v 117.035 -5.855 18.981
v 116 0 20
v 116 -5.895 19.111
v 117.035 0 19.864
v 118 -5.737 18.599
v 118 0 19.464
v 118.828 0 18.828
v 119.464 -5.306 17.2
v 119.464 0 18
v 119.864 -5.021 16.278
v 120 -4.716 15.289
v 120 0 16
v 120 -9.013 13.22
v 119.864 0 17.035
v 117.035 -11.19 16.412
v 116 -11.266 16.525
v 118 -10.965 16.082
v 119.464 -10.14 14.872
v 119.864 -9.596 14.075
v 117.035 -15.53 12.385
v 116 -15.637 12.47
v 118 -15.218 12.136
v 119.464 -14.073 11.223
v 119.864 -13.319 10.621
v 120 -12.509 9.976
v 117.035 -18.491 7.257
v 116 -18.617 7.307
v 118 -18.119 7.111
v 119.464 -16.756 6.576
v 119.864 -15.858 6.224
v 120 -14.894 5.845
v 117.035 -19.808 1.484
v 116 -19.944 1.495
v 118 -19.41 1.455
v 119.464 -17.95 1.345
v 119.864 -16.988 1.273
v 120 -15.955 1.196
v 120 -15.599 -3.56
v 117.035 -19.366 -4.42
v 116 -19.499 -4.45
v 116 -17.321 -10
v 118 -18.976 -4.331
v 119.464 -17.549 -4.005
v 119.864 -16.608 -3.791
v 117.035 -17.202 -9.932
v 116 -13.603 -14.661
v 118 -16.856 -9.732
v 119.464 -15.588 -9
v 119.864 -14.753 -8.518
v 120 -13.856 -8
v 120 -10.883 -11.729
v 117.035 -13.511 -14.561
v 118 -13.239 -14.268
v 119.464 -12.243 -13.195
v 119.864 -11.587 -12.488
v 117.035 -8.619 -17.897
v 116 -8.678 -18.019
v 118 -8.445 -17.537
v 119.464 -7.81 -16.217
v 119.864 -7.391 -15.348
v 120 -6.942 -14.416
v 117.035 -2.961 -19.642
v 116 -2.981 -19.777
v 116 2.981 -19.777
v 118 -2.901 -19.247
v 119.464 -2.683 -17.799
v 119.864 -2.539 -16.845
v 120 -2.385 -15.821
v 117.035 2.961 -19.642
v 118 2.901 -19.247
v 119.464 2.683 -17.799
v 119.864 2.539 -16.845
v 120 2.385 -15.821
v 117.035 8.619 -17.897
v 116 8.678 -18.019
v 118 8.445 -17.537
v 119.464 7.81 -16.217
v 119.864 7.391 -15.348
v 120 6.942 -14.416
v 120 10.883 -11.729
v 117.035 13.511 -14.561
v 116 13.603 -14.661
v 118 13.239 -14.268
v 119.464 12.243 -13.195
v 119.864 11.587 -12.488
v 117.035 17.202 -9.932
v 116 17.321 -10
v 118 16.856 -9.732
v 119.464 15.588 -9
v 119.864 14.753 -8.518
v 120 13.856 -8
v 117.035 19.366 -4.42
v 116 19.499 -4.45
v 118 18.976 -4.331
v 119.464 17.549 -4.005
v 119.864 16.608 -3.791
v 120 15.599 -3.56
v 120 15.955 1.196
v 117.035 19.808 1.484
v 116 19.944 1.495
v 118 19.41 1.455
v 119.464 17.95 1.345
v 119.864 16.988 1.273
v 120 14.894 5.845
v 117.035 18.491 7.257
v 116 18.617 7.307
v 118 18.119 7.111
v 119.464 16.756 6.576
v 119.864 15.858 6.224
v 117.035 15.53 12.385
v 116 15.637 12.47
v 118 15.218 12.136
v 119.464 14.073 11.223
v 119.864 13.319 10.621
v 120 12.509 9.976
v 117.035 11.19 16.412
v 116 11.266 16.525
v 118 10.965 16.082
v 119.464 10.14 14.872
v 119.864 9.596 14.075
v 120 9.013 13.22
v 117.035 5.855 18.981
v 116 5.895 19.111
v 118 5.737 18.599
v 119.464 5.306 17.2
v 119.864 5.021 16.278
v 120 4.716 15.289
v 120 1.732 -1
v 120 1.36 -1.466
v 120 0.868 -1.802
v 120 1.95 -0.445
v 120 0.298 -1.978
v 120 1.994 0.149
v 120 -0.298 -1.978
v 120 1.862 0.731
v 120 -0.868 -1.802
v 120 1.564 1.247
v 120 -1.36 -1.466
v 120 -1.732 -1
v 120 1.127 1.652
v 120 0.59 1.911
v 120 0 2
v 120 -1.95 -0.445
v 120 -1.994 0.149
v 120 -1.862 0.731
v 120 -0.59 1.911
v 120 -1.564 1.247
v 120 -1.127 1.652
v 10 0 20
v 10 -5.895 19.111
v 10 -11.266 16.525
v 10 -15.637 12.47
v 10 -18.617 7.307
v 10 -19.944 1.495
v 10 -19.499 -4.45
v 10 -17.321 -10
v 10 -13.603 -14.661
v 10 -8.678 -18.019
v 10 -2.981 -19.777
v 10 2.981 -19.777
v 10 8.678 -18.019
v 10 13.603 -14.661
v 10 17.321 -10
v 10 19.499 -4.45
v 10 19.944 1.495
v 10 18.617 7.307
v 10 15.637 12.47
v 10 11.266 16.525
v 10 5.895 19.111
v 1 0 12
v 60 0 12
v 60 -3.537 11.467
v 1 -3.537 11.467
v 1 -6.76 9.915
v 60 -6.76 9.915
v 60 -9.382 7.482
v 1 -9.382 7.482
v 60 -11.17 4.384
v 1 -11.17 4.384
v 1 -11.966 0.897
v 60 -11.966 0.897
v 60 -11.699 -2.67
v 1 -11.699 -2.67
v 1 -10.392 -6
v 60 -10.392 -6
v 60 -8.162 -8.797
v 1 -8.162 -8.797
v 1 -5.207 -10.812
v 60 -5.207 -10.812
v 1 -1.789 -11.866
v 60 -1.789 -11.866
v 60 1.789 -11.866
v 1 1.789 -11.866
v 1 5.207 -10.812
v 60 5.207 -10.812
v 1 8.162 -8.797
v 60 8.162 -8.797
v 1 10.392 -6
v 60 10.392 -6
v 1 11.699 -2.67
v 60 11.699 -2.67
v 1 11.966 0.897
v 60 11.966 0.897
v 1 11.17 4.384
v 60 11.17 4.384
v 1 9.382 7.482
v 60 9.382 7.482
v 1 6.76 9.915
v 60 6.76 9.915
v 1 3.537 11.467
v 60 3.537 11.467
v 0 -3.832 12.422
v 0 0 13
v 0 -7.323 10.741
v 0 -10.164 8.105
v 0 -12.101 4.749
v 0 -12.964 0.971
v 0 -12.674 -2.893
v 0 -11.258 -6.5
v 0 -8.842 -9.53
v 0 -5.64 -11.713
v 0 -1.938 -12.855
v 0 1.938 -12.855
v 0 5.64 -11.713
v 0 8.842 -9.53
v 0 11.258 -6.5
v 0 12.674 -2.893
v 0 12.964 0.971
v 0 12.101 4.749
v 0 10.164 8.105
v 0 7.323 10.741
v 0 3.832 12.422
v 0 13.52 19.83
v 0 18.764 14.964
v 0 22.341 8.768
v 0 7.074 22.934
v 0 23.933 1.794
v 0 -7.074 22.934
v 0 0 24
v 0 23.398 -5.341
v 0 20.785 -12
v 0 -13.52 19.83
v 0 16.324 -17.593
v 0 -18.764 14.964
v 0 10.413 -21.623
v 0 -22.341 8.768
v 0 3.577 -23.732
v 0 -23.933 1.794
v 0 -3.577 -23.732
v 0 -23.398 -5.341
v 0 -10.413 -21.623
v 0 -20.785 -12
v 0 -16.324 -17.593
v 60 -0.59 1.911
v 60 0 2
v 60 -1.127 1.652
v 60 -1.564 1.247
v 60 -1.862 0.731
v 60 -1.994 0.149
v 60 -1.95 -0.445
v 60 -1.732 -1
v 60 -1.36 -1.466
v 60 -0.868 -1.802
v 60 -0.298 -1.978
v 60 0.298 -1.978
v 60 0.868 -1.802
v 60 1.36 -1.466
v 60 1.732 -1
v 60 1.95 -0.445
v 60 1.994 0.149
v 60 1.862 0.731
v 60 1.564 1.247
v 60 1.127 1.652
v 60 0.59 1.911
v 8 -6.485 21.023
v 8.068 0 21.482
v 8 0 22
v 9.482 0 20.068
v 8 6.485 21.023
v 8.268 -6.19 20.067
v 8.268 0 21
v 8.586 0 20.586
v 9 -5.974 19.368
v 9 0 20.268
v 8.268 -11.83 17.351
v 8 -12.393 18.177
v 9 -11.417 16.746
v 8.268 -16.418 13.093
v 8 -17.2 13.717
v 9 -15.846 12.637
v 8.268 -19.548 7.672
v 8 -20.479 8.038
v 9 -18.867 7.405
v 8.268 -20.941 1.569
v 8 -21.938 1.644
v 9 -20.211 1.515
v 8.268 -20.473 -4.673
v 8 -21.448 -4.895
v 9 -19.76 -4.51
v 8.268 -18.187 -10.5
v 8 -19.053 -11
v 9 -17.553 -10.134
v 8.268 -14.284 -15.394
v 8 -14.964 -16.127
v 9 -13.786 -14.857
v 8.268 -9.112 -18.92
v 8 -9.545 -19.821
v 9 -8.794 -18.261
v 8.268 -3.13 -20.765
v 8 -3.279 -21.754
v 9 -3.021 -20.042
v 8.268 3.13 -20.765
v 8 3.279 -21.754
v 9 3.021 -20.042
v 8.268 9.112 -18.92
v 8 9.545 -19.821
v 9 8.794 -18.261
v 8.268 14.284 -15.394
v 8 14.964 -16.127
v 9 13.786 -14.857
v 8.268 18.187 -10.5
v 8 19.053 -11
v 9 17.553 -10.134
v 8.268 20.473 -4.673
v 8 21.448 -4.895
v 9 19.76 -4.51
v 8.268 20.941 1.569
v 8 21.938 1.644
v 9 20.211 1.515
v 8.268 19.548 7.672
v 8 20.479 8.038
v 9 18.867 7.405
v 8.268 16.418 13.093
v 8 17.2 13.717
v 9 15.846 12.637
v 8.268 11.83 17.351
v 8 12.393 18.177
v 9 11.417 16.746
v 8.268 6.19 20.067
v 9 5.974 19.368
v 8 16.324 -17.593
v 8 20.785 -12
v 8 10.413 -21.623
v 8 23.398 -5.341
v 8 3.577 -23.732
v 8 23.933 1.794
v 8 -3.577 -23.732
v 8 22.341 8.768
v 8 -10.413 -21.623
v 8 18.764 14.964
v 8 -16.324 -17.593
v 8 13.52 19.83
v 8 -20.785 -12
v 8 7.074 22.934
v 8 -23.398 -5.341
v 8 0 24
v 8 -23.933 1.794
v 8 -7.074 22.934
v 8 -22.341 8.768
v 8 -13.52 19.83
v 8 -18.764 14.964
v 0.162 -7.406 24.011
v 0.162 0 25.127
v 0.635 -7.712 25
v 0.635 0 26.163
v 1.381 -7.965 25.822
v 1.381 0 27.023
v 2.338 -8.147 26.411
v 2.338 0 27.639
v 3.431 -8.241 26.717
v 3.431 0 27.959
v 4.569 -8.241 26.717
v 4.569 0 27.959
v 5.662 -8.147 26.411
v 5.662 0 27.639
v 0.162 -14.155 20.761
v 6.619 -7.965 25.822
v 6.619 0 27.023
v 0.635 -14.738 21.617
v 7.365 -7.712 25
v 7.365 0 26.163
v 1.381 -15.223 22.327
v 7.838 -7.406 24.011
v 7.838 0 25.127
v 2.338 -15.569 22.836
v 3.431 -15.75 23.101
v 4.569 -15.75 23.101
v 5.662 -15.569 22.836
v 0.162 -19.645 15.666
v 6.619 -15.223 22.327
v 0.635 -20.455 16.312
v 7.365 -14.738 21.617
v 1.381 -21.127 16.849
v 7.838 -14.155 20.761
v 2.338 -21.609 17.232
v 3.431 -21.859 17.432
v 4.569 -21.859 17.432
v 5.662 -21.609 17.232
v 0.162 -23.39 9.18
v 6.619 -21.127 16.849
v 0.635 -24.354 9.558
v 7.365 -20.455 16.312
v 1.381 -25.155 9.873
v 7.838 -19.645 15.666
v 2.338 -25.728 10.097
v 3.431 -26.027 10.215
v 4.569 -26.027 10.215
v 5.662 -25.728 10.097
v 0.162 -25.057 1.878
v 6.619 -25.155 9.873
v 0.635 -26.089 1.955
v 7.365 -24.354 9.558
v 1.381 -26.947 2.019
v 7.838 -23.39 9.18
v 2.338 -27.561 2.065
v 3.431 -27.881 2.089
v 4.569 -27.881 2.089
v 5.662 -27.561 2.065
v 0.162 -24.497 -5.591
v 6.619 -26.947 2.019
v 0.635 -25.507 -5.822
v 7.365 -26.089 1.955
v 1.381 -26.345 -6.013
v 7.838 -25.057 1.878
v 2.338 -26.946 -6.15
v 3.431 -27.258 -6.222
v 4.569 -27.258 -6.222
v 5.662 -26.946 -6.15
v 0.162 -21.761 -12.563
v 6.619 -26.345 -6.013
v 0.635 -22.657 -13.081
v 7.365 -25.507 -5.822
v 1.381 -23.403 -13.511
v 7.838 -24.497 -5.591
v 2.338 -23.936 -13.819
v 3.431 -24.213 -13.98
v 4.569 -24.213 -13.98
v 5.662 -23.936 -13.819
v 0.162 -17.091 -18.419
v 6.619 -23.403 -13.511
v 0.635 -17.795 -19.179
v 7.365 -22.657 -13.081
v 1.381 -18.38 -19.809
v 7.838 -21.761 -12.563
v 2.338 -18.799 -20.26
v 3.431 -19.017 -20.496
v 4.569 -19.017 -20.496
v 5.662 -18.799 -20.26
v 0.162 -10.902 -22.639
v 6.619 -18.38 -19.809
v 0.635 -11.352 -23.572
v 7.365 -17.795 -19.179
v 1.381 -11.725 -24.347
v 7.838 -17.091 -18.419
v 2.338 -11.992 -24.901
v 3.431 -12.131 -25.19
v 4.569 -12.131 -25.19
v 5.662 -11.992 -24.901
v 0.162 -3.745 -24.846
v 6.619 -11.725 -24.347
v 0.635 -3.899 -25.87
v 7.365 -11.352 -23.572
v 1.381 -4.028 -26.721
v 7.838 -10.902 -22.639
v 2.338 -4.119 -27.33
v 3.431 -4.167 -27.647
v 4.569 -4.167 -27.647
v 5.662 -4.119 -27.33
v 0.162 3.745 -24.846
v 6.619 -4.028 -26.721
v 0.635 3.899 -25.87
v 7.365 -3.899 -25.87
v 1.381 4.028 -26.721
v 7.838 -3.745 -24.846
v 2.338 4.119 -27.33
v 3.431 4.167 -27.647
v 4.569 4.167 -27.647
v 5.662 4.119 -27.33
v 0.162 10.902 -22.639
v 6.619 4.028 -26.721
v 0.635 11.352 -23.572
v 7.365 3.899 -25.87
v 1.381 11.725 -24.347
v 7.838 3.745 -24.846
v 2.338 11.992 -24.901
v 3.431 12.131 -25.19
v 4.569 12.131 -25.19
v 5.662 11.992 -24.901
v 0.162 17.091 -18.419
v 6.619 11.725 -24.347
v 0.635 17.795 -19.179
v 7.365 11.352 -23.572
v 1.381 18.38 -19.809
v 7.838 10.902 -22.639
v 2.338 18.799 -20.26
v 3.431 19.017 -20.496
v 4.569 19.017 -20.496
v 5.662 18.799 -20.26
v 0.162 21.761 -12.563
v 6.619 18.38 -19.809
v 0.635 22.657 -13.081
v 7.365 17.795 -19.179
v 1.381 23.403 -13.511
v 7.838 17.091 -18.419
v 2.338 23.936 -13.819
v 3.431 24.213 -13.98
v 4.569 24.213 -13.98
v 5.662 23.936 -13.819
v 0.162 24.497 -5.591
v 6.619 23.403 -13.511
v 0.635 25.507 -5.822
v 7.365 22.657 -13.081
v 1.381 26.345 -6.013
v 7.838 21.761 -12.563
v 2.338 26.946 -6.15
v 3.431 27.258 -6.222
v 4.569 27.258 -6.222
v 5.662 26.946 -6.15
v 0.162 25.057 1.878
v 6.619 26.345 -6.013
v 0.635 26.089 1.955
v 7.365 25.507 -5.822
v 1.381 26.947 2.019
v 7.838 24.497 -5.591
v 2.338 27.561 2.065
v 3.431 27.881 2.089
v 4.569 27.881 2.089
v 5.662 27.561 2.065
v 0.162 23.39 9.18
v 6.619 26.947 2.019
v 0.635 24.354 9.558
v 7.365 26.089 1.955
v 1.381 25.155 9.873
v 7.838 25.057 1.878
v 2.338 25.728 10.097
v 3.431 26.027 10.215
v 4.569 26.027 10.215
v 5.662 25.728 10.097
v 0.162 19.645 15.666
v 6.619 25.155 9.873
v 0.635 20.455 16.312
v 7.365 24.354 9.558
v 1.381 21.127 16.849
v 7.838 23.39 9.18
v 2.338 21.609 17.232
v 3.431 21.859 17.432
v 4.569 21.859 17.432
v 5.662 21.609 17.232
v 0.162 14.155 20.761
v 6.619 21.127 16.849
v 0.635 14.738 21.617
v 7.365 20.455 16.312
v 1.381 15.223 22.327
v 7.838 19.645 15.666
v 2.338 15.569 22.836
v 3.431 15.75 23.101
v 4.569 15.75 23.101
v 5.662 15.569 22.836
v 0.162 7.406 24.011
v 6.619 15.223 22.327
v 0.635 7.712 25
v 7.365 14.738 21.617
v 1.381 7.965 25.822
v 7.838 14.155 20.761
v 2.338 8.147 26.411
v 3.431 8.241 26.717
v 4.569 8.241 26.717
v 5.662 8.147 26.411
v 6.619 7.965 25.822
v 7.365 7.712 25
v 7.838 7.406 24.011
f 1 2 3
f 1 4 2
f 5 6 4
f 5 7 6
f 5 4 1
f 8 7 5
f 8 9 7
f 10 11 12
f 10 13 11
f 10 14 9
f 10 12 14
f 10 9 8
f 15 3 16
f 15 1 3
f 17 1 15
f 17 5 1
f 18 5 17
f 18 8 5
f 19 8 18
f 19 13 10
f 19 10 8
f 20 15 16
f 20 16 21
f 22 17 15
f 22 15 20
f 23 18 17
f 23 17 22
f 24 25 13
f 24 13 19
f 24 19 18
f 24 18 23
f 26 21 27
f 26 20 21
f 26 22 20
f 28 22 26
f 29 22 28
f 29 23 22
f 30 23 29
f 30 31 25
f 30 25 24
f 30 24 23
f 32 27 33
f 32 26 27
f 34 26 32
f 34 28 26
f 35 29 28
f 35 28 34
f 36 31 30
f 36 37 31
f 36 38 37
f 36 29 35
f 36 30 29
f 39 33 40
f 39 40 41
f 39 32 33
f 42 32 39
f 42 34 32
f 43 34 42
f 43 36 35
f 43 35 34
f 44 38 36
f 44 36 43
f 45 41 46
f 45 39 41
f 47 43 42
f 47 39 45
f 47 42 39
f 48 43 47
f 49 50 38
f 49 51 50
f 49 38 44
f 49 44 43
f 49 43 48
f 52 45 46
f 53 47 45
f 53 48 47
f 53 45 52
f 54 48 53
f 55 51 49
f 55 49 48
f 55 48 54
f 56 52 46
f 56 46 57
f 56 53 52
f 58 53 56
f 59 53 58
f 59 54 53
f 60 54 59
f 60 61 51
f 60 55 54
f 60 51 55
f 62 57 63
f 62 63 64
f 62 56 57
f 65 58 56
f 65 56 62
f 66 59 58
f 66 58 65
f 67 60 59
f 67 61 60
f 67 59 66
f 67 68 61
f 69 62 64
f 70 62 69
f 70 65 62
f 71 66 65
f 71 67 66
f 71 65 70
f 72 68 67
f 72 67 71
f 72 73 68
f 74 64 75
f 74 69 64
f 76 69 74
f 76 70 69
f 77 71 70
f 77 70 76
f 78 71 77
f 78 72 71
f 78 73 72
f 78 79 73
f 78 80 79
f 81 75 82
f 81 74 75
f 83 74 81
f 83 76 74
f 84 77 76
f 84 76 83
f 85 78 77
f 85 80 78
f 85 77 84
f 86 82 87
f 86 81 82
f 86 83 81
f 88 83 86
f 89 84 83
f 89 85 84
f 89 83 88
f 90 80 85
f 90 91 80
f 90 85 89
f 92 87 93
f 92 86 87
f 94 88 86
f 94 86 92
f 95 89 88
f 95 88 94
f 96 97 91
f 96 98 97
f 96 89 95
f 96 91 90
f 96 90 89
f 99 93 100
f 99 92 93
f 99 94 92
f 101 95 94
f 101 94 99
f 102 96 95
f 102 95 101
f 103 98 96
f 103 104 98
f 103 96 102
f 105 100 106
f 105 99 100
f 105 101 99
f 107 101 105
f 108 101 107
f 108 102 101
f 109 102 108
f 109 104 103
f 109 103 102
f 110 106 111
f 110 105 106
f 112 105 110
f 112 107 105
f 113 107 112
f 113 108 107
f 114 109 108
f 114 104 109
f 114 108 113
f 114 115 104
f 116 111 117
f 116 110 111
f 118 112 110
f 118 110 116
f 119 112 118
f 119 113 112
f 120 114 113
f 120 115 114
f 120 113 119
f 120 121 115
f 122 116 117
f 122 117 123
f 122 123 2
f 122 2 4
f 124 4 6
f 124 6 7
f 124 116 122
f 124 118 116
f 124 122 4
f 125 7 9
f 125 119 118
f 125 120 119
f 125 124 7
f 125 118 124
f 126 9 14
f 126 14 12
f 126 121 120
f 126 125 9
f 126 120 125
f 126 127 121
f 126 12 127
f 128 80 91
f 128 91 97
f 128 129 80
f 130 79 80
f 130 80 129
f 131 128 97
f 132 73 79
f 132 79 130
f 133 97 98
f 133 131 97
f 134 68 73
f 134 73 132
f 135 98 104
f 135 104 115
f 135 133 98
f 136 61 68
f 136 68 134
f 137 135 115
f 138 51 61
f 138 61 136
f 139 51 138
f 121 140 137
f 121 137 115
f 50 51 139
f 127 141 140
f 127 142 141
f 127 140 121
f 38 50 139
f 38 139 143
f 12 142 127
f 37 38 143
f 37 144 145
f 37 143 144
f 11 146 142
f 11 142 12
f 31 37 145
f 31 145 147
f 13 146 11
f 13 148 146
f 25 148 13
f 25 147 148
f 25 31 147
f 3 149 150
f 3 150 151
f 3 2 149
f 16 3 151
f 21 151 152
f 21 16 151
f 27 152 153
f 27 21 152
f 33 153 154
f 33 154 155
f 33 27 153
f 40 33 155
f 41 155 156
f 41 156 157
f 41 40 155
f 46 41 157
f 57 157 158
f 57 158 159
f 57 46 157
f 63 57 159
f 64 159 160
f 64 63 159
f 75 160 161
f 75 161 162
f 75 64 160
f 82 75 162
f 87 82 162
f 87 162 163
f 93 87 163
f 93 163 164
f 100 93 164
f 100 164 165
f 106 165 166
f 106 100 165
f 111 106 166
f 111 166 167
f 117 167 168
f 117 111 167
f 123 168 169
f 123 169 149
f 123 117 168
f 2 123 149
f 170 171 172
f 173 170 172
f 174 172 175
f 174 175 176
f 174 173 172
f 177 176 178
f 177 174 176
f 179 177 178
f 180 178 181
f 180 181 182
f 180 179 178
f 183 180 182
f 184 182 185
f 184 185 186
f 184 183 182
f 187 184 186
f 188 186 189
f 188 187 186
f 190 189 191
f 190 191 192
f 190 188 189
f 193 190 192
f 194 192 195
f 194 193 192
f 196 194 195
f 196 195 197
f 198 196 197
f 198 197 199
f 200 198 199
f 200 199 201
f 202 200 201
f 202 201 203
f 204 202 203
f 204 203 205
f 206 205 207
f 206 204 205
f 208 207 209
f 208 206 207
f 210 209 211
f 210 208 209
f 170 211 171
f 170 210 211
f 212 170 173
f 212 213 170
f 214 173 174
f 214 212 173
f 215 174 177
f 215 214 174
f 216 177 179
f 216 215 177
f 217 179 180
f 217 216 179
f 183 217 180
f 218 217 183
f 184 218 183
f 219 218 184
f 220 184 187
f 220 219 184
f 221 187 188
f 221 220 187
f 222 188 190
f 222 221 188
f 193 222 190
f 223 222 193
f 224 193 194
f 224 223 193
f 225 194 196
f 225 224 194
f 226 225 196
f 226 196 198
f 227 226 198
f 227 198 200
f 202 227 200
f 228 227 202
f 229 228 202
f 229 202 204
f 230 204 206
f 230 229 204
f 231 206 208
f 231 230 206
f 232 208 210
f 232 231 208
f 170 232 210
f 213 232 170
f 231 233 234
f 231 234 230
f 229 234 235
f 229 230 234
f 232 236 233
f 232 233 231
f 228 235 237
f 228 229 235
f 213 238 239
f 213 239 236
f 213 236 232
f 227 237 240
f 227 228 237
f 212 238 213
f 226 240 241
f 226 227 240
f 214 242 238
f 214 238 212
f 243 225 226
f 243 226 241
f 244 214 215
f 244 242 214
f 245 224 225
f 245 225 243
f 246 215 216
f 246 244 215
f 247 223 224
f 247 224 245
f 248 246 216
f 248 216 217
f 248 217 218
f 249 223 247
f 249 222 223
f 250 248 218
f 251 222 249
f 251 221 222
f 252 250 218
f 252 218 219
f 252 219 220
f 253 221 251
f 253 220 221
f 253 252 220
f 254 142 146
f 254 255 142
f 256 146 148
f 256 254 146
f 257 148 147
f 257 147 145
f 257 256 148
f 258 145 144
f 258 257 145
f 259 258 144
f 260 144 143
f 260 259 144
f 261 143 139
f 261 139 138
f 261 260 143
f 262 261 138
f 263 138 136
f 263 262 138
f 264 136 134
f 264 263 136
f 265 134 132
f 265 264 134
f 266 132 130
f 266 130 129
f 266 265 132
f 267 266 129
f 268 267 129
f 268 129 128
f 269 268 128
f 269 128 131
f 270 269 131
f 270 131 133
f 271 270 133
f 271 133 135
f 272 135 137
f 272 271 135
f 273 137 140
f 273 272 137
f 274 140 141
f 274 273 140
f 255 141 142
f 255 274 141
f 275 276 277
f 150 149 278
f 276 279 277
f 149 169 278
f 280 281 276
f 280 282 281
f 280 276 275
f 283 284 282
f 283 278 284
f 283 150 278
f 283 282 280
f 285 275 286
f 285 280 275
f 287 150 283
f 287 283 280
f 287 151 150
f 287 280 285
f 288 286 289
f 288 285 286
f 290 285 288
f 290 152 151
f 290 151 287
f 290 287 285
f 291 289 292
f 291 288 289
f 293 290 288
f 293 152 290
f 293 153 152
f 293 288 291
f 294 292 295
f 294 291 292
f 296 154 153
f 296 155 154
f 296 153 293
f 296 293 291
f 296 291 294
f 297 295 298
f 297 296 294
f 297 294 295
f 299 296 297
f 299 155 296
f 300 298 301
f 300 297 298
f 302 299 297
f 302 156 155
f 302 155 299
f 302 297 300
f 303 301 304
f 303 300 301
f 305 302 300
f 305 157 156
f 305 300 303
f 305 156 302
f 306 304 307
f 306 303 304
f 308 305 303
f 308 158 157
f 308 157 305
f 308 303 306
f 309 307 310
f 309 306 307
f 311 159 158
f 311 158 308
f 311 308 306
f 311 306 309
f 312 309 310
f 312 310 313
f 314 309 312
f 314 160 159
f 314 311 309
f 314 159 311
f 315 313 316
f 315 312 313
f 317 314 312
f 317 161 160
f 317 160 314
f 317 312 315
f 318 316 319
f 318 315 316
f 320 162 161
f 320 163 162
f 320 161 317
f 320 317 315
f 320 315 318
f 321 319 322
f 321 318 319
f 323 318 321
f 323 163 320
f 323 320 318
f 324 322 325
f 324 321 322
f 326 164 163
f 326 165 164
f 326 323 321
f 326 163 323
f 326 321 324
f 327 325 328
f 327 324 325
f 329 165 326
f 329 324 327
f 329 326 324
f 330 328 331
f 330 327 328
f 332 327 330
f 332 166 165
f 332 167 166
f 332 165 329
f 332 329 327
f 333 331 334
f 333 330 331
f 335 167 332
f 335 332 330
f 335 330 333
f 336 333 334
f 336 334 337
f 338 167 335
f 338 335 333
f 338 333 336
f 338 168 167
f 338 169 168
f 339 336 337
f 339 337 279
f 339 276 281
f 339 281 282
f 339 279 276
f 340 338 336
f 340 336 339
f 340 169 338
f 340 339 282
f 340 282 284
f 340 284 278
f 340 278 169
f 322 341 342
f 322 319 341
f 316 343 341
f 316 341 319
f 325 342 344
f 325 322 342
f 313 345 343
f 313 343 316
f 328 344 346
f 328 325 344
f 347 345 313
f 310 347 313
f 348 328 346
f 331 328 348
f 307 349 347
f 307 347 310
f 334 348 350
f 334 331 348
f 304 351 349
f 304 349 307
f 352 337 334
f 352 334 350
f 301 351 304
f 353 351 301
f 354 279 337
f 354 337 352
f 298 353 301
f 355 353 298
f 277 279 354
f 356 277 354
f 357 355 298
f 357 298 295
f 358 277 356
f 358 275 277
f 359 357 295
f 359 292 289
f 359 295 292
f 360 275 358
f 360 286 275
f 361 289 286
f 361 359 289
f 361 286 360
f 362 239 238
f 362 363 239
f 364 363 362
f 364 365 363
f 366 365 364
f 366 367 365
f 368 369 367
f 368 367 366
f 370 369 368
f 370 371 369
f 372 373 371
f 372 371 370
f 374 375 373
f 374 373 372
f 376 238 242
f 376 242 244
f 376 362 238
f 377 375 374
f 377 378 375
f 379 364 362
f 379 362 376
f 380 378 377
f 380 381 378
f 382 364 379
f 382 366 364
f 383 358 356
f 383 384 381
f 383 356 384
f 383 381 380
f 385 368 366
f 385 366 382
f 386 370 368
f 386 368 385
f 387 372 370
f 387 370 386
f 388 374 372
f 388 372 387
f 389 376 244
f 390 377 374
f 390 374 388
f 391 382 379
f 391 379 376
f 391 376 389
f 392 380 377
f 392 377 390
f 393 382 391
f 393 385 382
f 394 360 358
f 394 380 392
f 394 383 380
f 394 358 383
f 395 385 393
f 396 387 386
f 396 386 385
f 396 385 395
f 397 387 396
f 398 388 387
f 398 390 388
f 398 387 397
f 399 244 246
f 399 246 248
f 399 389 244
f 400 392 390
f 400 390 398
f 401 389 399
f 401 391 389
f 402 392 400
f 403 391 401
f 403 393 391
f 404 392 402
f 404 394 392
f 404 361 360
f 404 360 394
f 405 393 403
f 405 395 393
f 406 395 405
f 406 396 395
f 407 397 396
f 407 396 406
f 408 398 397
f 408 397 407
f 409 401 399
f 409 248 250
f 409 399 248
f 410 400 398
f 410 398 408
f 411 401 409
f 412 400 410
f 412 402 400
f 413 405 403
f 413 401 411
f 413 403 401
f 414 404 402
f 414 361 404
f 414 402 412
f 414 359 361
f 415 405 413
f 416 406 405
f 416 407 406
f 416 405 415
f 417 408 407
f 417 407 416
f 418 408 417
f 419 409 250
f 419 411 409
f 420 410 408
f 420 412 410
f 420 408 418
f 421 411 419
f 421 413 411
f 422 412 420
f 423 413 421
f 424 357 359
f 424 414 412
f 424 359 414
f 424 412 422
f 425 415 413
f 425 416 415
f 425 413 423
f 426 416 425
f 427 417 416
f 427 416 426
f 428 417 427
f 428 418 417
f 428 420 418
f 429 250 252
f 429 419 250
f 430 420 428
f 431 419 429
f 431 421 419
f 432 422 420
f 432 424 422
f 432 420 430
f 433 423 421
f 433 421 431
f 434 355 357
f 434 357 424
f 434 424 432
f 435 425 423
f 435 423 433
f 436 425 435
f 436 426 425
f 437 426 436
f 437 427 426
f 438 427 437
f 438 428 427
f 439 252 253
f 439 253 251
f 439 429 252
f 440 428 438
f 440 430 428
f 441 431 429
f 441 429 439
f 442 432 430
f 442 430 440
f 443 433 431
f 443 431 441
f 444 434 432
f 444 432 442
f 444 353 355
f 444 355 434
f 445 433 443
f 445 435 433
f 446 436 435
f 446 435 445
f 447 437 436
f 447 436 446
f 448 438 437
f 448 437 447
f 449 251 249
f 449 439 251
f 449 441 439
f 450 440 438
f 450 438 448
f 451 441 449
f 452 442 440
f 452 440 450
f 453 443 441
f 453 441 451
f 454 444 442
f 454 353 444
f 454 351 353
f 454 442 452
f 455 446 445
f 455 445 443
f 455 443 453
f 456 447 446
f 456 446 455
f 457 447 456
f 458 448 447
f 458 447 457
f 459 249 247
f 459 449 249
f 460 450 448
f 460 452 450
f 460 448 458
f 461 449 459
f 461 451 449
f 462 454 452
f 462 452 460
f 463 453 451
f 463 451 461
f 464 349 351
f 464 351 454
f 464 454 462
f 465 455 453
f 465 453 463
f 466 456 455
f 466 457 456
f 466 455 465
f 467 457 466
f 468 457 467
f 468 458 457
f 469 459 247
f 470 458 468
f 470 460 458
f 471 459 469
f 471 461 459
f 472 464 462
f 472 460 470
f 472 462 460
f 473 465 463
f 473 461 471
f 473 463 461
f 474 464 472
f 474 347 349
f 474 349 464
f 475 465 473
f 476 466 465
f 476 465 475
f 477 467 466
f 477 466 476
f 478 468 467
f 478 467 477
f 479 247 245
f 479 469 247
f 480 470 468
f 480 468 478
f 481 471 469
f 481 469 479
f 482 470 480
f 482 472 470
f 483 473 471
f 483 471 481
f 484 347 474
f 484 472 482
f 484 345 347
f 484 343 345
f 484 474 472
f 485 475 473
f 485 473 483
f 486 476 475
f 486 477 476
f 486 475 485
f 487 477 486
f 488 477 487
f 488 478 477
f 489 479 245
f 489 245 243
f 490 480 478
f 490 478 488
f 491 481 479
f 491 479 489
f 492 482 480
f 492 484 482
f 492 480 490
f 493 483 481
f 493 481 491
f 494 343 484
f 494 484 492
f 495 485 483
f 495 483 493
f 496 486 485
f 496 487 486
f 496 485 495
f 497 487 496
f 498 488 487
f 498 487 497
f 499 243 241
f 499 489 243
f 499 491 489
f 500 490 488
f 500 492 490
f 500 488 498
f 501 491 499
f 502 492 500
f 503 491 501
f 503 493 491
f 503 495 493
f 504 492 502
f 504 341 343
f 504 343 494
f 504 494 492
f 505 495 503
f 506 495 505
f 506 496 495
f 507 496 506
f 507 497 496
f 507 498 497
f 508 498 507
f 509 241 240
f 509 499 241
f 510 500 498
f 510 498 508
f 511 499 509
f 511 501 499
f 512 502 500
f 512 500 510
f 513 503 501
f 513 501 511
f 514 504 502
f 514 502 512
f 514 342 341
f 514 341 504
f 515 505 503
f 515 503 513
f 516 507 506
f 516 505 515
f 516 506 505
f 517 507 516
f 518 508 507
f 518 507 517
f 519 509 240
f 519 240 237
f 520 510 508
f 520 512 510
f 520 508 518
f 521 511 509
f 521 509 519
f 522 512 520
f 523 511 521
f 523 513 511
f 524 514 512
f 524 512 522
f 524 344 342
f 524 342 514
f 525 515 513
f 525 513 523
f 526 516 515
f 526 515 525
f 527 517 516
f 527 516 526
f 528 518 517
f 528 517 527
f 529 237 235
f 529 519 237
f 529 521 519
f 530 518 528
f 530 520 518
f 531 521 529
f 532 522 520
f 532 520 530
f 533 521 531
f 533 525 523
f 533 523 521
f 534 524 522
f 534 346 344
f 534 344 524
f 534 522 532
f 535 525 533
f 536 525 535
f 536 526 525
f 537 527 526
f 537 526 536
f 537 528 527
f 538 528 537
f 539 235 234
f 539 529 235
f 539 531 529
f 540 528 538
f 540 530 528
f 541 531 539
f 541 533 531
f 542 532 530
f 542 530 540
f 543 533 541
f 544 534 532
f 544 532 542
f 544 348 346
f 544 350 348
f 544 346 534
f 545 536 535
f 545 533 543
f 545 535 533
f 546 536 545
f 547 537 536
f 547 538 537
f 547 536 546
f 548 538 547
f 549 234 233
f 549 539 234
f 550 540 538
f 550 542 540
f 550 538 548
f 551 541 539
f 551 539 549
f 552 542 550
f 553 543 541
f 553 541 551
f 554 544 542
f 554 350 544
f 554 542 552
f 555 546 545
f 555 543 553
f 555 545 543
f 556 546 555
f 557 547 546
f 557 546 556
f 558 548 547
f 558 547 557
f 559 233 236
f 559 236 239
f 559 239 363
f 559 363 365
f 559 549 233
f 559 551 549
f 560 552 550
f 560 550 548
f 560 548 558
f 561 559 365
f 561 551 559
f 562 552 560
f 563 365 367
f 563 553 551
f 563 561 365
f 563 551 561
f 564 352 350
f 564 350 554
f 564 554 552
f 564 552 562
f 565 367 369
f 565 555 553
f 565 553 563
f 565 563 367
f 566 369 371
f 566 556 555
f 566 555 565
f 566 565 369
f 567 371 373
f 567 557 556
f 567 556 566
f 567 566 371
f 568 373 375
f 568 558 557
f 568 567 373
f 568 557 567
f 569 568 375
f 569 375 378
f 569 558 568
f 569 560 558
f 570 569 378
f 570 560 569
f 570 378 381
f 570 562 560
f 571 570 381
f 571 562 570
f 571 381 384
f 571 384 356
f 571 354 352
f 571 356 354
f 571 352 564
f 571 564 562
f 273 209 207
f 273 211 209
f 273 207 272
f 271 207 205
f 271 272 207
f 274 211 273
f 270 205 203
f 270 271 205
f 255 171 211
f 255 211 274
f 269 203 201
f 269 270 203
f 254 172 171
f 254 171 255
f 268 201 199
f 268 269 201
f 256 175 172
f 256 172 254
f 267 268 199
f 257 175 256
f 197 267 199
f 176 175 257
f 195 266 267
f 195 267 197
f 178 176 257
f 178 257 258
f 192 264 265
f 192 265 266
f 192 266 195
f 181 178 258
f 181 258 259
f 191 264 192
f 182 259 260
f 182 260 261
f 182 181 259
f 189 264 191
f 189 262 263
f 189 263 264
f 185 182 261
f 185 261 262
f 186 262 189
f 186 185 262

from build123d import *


with BuildPart() as part:
    # 草图1 → 旋转1 (revolve)
    with BuildSketch(Plane.XY, mode=Mode.PRIVATE) as revolve_1_sk:
        with BuildLine():
            Line((0, 13), (0, 24))
            ThreePointArc((0, 24), (4, 28), (8, 24))
            Line((8, 24), (8, 22))
            ThreePointArc((8, 22), (8.585786438, 20.585786438), (10, 20))
            Line((10, 20), (116, 20))
            ThreePointArc((116, 20), (118.828427125, 18.828427125), (120, 16))
            Line((120, 16), (120, 2))
            Line((120, 2), (117, 2))
            Line((117, 2), (60, 2))
            Line((60, 2), (60, 12))
            Line((60, 12), (1, 12))
            Line((1, 12), (0, 13))
        make_face()
    revolve(revolve_1_sk.sketch.rotate(Axis((0, 0, 0), (1, 0, 0)), 90), axis=Axis((0, 0, 0), (1, 0, 0)))


solid = part.part
